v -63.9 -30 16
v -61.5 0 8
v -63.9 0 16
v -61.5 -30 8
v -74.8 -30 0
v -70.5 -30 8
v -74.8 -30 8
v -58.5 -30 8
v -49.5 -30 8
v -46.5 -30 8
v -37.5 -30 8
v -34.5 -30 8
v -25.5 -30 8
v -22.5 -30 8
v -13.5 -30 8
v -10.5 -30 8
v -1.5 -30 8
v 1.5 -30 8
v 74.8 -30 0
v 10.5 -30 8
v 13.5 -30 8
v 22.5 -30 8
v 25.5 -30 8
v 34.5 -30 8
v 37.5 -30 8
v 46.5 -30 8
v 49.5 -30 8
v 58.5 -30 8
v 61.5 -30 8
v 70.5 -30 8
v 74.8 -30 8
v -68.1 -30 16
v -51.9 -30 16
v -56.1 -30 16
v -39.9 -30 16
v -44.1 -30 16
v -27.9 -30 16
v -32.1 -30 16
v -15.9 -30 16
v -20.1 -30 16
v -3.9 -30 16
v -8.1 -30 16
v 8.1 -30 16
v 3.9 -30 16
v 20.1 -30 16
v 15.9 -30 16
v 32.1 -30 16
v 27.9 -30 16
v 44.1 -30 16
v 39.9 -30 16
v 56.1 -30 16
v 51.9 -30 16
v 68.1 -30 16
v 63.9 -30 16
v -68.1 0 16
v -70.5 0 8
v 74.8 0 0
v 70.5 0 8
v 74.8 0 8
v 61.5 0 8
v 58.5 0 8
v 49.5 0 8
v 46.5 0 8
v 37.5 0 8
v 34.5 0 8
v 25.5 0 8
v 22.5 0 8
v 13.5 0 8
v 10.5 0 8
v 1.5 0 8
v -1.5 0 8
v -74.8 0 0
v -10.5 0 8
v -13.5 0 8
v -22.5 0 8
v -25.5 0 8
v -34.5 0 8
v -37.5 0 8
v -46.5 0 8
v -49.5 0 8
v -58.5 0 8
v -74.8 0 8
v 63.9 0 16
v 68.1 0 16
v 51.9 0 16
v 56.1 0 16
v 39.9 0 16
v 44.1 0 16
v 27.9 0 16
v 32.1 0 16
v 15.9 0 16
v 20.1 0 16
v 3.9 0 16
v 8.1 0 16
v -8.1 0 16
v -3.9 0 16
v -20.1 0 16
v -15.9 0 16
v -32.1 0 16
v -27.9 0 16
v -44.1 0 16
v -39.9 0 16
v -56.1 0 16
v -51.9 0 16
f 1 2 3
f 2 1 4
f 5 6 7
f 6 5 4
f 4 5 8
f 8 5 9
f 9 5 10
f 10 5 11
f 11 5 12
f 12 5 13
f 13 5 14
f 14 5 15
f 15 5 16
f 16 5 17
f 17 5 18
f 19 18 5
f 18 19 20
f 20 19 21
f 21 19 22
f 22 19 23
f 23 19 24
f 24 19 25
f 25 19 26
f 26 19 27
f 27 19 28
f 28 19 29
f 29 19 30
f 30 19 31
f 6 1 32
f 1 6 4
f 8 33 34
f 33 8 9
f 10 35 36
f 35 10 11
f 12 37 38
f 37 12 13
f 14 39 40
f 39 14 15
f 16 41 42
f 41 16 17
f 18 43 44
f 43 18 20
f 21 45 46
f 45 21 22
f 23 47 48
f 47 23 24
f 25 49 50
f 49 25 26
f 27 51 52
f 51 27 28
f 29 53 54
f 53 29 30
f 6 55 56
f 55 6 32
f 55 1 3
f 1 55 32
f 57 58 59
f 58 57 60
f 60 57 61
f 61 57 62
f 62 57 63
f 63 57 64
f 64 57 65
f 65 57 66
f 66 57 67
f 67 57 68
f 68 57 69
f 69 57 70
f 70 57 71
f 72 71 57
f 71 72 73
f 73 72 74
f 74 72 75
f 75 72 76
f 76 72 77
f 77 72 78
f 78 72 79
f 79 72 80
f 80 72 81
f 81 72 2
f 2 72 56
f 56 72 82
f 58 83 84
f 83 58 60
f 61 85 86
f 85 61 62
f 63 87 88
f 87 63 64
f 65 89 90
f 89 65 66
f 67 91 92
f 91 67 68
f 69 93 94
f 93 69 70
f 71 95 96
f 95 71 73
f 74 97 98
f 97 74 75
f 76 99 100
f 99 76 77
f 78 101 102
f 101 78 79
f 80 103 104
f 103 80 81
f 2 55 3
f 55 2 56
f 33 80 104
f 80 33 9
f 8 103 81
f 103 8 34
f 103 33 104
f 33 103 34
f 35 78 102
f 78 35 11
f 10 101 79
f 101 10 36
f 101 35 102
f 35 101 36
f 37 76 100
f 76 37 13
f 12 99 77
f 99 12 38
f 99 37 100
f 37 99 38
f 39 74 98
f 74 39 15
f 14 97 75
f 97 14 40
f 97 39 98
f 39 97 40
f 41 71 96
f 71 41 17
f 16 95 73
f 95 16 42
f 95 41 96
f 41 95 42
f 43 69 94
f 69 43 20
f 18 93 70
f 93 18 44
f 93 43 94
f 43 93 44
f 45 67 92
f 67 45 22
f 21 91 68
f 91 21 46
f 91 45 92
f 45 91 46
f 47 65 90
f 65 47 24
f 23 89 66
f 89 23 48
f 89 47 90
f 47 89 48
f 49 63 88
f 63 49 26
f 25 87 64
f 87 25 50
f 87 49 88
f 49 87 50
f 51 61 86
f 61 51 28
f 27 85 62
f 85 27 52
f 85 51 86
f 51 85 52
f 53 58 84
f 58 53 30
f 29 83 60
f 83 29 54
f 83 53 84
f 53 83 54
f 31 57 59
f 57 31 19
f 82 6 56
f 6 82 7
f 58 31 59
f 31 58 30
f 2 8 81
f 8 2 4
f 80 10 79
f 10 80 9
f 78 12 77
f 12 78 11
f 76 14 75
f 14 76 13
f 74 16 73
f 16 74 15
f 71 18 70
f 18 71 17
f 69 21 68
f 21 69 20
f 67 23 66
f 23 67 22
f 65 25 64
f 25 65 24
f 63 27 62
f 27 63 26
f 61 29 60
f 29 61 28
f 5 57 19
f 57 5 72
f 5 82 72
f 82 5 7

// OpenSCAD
$fn = 32;

// ----------------------------------------------------------------------
// Toothed rack, 12 teeth
// 12 mm pitch, 8 mm teeth
// ----------------------------------------------------------------------

// --- parameters (mm) ---
bar_w = 30;     // bar width (Y)
bar_h = 8;      // bar height (Z)
teeth = 12;     // number of teeth
pitch = 12;     // tooth pitch
tooth_h = 8;    // tooth height above the bar
root_w = 9.6;   // tooth width at the root
crest_w = 4.2;  // tooth width at the crest

// --- derived feature positions (mm) ---
span = (teeth - 1) * pitch;  // = 132   distance between the outer teeth
bar_l = span + root_w + 8;   // = 149.6   bar length: teeth plus 4 mm at each end
tooth_x = -span / 2;         // = -66   X of the first tooth
height = bar_h + tooth_h;    // = 16   overall height
feature_centers = [
  [tooth_x + 0 * pitch, -bar_w / 2],
  [tooth_x + 1 * pitch, -bar_w / 2],
  [tooth_x + 2 * pitch, -bar_w / 2],
  [tooth_x + 3 * pitch, -bar_w / 2],
  [tooth_x + 4 * pitch, -bar_w / 2],
  [tooth_x + 5 * pitch, -bar_w / 2],
  [tooth_x + 6 * pitch, -bar_w / 2],
  [tooth_x + 7 * pitch, -bar_w / 2],
  [tooth_x + 8 * pitch, -bar_w / 2],
  [tooth_x + 9 * pitch, -bar_w / 2],
  [tooth_x + 10 * pitch, -bar_w / 2],
  [tooth_x + 11 * pitch, -bar_w / 2]
];   // tooth centre line, drives the tooth loop

// bar with a rack of teeth, one extruded trapezoium per centre
module rack_tooth() {
  linear_extrude(height = bar_w)
    polygon(points = [
      [0, 0],
      [root_w, 0],
      [root_w / 2 + crest_w / 2, tooth_h + 1],
      [root_w / 2 - crest_w / 2, tooth_h + 1]
    ]);
}

union() {
  translate([-bar_l / 2, -bar_w, 0]) cube([bar_l, bar_w, bar_h]);
  for (centre = feature_centers)
    translate([centre[0] - root_w / 2, 0, bar_h - 1]) rotate([90, 0, 0]) rack_tooth();
}
